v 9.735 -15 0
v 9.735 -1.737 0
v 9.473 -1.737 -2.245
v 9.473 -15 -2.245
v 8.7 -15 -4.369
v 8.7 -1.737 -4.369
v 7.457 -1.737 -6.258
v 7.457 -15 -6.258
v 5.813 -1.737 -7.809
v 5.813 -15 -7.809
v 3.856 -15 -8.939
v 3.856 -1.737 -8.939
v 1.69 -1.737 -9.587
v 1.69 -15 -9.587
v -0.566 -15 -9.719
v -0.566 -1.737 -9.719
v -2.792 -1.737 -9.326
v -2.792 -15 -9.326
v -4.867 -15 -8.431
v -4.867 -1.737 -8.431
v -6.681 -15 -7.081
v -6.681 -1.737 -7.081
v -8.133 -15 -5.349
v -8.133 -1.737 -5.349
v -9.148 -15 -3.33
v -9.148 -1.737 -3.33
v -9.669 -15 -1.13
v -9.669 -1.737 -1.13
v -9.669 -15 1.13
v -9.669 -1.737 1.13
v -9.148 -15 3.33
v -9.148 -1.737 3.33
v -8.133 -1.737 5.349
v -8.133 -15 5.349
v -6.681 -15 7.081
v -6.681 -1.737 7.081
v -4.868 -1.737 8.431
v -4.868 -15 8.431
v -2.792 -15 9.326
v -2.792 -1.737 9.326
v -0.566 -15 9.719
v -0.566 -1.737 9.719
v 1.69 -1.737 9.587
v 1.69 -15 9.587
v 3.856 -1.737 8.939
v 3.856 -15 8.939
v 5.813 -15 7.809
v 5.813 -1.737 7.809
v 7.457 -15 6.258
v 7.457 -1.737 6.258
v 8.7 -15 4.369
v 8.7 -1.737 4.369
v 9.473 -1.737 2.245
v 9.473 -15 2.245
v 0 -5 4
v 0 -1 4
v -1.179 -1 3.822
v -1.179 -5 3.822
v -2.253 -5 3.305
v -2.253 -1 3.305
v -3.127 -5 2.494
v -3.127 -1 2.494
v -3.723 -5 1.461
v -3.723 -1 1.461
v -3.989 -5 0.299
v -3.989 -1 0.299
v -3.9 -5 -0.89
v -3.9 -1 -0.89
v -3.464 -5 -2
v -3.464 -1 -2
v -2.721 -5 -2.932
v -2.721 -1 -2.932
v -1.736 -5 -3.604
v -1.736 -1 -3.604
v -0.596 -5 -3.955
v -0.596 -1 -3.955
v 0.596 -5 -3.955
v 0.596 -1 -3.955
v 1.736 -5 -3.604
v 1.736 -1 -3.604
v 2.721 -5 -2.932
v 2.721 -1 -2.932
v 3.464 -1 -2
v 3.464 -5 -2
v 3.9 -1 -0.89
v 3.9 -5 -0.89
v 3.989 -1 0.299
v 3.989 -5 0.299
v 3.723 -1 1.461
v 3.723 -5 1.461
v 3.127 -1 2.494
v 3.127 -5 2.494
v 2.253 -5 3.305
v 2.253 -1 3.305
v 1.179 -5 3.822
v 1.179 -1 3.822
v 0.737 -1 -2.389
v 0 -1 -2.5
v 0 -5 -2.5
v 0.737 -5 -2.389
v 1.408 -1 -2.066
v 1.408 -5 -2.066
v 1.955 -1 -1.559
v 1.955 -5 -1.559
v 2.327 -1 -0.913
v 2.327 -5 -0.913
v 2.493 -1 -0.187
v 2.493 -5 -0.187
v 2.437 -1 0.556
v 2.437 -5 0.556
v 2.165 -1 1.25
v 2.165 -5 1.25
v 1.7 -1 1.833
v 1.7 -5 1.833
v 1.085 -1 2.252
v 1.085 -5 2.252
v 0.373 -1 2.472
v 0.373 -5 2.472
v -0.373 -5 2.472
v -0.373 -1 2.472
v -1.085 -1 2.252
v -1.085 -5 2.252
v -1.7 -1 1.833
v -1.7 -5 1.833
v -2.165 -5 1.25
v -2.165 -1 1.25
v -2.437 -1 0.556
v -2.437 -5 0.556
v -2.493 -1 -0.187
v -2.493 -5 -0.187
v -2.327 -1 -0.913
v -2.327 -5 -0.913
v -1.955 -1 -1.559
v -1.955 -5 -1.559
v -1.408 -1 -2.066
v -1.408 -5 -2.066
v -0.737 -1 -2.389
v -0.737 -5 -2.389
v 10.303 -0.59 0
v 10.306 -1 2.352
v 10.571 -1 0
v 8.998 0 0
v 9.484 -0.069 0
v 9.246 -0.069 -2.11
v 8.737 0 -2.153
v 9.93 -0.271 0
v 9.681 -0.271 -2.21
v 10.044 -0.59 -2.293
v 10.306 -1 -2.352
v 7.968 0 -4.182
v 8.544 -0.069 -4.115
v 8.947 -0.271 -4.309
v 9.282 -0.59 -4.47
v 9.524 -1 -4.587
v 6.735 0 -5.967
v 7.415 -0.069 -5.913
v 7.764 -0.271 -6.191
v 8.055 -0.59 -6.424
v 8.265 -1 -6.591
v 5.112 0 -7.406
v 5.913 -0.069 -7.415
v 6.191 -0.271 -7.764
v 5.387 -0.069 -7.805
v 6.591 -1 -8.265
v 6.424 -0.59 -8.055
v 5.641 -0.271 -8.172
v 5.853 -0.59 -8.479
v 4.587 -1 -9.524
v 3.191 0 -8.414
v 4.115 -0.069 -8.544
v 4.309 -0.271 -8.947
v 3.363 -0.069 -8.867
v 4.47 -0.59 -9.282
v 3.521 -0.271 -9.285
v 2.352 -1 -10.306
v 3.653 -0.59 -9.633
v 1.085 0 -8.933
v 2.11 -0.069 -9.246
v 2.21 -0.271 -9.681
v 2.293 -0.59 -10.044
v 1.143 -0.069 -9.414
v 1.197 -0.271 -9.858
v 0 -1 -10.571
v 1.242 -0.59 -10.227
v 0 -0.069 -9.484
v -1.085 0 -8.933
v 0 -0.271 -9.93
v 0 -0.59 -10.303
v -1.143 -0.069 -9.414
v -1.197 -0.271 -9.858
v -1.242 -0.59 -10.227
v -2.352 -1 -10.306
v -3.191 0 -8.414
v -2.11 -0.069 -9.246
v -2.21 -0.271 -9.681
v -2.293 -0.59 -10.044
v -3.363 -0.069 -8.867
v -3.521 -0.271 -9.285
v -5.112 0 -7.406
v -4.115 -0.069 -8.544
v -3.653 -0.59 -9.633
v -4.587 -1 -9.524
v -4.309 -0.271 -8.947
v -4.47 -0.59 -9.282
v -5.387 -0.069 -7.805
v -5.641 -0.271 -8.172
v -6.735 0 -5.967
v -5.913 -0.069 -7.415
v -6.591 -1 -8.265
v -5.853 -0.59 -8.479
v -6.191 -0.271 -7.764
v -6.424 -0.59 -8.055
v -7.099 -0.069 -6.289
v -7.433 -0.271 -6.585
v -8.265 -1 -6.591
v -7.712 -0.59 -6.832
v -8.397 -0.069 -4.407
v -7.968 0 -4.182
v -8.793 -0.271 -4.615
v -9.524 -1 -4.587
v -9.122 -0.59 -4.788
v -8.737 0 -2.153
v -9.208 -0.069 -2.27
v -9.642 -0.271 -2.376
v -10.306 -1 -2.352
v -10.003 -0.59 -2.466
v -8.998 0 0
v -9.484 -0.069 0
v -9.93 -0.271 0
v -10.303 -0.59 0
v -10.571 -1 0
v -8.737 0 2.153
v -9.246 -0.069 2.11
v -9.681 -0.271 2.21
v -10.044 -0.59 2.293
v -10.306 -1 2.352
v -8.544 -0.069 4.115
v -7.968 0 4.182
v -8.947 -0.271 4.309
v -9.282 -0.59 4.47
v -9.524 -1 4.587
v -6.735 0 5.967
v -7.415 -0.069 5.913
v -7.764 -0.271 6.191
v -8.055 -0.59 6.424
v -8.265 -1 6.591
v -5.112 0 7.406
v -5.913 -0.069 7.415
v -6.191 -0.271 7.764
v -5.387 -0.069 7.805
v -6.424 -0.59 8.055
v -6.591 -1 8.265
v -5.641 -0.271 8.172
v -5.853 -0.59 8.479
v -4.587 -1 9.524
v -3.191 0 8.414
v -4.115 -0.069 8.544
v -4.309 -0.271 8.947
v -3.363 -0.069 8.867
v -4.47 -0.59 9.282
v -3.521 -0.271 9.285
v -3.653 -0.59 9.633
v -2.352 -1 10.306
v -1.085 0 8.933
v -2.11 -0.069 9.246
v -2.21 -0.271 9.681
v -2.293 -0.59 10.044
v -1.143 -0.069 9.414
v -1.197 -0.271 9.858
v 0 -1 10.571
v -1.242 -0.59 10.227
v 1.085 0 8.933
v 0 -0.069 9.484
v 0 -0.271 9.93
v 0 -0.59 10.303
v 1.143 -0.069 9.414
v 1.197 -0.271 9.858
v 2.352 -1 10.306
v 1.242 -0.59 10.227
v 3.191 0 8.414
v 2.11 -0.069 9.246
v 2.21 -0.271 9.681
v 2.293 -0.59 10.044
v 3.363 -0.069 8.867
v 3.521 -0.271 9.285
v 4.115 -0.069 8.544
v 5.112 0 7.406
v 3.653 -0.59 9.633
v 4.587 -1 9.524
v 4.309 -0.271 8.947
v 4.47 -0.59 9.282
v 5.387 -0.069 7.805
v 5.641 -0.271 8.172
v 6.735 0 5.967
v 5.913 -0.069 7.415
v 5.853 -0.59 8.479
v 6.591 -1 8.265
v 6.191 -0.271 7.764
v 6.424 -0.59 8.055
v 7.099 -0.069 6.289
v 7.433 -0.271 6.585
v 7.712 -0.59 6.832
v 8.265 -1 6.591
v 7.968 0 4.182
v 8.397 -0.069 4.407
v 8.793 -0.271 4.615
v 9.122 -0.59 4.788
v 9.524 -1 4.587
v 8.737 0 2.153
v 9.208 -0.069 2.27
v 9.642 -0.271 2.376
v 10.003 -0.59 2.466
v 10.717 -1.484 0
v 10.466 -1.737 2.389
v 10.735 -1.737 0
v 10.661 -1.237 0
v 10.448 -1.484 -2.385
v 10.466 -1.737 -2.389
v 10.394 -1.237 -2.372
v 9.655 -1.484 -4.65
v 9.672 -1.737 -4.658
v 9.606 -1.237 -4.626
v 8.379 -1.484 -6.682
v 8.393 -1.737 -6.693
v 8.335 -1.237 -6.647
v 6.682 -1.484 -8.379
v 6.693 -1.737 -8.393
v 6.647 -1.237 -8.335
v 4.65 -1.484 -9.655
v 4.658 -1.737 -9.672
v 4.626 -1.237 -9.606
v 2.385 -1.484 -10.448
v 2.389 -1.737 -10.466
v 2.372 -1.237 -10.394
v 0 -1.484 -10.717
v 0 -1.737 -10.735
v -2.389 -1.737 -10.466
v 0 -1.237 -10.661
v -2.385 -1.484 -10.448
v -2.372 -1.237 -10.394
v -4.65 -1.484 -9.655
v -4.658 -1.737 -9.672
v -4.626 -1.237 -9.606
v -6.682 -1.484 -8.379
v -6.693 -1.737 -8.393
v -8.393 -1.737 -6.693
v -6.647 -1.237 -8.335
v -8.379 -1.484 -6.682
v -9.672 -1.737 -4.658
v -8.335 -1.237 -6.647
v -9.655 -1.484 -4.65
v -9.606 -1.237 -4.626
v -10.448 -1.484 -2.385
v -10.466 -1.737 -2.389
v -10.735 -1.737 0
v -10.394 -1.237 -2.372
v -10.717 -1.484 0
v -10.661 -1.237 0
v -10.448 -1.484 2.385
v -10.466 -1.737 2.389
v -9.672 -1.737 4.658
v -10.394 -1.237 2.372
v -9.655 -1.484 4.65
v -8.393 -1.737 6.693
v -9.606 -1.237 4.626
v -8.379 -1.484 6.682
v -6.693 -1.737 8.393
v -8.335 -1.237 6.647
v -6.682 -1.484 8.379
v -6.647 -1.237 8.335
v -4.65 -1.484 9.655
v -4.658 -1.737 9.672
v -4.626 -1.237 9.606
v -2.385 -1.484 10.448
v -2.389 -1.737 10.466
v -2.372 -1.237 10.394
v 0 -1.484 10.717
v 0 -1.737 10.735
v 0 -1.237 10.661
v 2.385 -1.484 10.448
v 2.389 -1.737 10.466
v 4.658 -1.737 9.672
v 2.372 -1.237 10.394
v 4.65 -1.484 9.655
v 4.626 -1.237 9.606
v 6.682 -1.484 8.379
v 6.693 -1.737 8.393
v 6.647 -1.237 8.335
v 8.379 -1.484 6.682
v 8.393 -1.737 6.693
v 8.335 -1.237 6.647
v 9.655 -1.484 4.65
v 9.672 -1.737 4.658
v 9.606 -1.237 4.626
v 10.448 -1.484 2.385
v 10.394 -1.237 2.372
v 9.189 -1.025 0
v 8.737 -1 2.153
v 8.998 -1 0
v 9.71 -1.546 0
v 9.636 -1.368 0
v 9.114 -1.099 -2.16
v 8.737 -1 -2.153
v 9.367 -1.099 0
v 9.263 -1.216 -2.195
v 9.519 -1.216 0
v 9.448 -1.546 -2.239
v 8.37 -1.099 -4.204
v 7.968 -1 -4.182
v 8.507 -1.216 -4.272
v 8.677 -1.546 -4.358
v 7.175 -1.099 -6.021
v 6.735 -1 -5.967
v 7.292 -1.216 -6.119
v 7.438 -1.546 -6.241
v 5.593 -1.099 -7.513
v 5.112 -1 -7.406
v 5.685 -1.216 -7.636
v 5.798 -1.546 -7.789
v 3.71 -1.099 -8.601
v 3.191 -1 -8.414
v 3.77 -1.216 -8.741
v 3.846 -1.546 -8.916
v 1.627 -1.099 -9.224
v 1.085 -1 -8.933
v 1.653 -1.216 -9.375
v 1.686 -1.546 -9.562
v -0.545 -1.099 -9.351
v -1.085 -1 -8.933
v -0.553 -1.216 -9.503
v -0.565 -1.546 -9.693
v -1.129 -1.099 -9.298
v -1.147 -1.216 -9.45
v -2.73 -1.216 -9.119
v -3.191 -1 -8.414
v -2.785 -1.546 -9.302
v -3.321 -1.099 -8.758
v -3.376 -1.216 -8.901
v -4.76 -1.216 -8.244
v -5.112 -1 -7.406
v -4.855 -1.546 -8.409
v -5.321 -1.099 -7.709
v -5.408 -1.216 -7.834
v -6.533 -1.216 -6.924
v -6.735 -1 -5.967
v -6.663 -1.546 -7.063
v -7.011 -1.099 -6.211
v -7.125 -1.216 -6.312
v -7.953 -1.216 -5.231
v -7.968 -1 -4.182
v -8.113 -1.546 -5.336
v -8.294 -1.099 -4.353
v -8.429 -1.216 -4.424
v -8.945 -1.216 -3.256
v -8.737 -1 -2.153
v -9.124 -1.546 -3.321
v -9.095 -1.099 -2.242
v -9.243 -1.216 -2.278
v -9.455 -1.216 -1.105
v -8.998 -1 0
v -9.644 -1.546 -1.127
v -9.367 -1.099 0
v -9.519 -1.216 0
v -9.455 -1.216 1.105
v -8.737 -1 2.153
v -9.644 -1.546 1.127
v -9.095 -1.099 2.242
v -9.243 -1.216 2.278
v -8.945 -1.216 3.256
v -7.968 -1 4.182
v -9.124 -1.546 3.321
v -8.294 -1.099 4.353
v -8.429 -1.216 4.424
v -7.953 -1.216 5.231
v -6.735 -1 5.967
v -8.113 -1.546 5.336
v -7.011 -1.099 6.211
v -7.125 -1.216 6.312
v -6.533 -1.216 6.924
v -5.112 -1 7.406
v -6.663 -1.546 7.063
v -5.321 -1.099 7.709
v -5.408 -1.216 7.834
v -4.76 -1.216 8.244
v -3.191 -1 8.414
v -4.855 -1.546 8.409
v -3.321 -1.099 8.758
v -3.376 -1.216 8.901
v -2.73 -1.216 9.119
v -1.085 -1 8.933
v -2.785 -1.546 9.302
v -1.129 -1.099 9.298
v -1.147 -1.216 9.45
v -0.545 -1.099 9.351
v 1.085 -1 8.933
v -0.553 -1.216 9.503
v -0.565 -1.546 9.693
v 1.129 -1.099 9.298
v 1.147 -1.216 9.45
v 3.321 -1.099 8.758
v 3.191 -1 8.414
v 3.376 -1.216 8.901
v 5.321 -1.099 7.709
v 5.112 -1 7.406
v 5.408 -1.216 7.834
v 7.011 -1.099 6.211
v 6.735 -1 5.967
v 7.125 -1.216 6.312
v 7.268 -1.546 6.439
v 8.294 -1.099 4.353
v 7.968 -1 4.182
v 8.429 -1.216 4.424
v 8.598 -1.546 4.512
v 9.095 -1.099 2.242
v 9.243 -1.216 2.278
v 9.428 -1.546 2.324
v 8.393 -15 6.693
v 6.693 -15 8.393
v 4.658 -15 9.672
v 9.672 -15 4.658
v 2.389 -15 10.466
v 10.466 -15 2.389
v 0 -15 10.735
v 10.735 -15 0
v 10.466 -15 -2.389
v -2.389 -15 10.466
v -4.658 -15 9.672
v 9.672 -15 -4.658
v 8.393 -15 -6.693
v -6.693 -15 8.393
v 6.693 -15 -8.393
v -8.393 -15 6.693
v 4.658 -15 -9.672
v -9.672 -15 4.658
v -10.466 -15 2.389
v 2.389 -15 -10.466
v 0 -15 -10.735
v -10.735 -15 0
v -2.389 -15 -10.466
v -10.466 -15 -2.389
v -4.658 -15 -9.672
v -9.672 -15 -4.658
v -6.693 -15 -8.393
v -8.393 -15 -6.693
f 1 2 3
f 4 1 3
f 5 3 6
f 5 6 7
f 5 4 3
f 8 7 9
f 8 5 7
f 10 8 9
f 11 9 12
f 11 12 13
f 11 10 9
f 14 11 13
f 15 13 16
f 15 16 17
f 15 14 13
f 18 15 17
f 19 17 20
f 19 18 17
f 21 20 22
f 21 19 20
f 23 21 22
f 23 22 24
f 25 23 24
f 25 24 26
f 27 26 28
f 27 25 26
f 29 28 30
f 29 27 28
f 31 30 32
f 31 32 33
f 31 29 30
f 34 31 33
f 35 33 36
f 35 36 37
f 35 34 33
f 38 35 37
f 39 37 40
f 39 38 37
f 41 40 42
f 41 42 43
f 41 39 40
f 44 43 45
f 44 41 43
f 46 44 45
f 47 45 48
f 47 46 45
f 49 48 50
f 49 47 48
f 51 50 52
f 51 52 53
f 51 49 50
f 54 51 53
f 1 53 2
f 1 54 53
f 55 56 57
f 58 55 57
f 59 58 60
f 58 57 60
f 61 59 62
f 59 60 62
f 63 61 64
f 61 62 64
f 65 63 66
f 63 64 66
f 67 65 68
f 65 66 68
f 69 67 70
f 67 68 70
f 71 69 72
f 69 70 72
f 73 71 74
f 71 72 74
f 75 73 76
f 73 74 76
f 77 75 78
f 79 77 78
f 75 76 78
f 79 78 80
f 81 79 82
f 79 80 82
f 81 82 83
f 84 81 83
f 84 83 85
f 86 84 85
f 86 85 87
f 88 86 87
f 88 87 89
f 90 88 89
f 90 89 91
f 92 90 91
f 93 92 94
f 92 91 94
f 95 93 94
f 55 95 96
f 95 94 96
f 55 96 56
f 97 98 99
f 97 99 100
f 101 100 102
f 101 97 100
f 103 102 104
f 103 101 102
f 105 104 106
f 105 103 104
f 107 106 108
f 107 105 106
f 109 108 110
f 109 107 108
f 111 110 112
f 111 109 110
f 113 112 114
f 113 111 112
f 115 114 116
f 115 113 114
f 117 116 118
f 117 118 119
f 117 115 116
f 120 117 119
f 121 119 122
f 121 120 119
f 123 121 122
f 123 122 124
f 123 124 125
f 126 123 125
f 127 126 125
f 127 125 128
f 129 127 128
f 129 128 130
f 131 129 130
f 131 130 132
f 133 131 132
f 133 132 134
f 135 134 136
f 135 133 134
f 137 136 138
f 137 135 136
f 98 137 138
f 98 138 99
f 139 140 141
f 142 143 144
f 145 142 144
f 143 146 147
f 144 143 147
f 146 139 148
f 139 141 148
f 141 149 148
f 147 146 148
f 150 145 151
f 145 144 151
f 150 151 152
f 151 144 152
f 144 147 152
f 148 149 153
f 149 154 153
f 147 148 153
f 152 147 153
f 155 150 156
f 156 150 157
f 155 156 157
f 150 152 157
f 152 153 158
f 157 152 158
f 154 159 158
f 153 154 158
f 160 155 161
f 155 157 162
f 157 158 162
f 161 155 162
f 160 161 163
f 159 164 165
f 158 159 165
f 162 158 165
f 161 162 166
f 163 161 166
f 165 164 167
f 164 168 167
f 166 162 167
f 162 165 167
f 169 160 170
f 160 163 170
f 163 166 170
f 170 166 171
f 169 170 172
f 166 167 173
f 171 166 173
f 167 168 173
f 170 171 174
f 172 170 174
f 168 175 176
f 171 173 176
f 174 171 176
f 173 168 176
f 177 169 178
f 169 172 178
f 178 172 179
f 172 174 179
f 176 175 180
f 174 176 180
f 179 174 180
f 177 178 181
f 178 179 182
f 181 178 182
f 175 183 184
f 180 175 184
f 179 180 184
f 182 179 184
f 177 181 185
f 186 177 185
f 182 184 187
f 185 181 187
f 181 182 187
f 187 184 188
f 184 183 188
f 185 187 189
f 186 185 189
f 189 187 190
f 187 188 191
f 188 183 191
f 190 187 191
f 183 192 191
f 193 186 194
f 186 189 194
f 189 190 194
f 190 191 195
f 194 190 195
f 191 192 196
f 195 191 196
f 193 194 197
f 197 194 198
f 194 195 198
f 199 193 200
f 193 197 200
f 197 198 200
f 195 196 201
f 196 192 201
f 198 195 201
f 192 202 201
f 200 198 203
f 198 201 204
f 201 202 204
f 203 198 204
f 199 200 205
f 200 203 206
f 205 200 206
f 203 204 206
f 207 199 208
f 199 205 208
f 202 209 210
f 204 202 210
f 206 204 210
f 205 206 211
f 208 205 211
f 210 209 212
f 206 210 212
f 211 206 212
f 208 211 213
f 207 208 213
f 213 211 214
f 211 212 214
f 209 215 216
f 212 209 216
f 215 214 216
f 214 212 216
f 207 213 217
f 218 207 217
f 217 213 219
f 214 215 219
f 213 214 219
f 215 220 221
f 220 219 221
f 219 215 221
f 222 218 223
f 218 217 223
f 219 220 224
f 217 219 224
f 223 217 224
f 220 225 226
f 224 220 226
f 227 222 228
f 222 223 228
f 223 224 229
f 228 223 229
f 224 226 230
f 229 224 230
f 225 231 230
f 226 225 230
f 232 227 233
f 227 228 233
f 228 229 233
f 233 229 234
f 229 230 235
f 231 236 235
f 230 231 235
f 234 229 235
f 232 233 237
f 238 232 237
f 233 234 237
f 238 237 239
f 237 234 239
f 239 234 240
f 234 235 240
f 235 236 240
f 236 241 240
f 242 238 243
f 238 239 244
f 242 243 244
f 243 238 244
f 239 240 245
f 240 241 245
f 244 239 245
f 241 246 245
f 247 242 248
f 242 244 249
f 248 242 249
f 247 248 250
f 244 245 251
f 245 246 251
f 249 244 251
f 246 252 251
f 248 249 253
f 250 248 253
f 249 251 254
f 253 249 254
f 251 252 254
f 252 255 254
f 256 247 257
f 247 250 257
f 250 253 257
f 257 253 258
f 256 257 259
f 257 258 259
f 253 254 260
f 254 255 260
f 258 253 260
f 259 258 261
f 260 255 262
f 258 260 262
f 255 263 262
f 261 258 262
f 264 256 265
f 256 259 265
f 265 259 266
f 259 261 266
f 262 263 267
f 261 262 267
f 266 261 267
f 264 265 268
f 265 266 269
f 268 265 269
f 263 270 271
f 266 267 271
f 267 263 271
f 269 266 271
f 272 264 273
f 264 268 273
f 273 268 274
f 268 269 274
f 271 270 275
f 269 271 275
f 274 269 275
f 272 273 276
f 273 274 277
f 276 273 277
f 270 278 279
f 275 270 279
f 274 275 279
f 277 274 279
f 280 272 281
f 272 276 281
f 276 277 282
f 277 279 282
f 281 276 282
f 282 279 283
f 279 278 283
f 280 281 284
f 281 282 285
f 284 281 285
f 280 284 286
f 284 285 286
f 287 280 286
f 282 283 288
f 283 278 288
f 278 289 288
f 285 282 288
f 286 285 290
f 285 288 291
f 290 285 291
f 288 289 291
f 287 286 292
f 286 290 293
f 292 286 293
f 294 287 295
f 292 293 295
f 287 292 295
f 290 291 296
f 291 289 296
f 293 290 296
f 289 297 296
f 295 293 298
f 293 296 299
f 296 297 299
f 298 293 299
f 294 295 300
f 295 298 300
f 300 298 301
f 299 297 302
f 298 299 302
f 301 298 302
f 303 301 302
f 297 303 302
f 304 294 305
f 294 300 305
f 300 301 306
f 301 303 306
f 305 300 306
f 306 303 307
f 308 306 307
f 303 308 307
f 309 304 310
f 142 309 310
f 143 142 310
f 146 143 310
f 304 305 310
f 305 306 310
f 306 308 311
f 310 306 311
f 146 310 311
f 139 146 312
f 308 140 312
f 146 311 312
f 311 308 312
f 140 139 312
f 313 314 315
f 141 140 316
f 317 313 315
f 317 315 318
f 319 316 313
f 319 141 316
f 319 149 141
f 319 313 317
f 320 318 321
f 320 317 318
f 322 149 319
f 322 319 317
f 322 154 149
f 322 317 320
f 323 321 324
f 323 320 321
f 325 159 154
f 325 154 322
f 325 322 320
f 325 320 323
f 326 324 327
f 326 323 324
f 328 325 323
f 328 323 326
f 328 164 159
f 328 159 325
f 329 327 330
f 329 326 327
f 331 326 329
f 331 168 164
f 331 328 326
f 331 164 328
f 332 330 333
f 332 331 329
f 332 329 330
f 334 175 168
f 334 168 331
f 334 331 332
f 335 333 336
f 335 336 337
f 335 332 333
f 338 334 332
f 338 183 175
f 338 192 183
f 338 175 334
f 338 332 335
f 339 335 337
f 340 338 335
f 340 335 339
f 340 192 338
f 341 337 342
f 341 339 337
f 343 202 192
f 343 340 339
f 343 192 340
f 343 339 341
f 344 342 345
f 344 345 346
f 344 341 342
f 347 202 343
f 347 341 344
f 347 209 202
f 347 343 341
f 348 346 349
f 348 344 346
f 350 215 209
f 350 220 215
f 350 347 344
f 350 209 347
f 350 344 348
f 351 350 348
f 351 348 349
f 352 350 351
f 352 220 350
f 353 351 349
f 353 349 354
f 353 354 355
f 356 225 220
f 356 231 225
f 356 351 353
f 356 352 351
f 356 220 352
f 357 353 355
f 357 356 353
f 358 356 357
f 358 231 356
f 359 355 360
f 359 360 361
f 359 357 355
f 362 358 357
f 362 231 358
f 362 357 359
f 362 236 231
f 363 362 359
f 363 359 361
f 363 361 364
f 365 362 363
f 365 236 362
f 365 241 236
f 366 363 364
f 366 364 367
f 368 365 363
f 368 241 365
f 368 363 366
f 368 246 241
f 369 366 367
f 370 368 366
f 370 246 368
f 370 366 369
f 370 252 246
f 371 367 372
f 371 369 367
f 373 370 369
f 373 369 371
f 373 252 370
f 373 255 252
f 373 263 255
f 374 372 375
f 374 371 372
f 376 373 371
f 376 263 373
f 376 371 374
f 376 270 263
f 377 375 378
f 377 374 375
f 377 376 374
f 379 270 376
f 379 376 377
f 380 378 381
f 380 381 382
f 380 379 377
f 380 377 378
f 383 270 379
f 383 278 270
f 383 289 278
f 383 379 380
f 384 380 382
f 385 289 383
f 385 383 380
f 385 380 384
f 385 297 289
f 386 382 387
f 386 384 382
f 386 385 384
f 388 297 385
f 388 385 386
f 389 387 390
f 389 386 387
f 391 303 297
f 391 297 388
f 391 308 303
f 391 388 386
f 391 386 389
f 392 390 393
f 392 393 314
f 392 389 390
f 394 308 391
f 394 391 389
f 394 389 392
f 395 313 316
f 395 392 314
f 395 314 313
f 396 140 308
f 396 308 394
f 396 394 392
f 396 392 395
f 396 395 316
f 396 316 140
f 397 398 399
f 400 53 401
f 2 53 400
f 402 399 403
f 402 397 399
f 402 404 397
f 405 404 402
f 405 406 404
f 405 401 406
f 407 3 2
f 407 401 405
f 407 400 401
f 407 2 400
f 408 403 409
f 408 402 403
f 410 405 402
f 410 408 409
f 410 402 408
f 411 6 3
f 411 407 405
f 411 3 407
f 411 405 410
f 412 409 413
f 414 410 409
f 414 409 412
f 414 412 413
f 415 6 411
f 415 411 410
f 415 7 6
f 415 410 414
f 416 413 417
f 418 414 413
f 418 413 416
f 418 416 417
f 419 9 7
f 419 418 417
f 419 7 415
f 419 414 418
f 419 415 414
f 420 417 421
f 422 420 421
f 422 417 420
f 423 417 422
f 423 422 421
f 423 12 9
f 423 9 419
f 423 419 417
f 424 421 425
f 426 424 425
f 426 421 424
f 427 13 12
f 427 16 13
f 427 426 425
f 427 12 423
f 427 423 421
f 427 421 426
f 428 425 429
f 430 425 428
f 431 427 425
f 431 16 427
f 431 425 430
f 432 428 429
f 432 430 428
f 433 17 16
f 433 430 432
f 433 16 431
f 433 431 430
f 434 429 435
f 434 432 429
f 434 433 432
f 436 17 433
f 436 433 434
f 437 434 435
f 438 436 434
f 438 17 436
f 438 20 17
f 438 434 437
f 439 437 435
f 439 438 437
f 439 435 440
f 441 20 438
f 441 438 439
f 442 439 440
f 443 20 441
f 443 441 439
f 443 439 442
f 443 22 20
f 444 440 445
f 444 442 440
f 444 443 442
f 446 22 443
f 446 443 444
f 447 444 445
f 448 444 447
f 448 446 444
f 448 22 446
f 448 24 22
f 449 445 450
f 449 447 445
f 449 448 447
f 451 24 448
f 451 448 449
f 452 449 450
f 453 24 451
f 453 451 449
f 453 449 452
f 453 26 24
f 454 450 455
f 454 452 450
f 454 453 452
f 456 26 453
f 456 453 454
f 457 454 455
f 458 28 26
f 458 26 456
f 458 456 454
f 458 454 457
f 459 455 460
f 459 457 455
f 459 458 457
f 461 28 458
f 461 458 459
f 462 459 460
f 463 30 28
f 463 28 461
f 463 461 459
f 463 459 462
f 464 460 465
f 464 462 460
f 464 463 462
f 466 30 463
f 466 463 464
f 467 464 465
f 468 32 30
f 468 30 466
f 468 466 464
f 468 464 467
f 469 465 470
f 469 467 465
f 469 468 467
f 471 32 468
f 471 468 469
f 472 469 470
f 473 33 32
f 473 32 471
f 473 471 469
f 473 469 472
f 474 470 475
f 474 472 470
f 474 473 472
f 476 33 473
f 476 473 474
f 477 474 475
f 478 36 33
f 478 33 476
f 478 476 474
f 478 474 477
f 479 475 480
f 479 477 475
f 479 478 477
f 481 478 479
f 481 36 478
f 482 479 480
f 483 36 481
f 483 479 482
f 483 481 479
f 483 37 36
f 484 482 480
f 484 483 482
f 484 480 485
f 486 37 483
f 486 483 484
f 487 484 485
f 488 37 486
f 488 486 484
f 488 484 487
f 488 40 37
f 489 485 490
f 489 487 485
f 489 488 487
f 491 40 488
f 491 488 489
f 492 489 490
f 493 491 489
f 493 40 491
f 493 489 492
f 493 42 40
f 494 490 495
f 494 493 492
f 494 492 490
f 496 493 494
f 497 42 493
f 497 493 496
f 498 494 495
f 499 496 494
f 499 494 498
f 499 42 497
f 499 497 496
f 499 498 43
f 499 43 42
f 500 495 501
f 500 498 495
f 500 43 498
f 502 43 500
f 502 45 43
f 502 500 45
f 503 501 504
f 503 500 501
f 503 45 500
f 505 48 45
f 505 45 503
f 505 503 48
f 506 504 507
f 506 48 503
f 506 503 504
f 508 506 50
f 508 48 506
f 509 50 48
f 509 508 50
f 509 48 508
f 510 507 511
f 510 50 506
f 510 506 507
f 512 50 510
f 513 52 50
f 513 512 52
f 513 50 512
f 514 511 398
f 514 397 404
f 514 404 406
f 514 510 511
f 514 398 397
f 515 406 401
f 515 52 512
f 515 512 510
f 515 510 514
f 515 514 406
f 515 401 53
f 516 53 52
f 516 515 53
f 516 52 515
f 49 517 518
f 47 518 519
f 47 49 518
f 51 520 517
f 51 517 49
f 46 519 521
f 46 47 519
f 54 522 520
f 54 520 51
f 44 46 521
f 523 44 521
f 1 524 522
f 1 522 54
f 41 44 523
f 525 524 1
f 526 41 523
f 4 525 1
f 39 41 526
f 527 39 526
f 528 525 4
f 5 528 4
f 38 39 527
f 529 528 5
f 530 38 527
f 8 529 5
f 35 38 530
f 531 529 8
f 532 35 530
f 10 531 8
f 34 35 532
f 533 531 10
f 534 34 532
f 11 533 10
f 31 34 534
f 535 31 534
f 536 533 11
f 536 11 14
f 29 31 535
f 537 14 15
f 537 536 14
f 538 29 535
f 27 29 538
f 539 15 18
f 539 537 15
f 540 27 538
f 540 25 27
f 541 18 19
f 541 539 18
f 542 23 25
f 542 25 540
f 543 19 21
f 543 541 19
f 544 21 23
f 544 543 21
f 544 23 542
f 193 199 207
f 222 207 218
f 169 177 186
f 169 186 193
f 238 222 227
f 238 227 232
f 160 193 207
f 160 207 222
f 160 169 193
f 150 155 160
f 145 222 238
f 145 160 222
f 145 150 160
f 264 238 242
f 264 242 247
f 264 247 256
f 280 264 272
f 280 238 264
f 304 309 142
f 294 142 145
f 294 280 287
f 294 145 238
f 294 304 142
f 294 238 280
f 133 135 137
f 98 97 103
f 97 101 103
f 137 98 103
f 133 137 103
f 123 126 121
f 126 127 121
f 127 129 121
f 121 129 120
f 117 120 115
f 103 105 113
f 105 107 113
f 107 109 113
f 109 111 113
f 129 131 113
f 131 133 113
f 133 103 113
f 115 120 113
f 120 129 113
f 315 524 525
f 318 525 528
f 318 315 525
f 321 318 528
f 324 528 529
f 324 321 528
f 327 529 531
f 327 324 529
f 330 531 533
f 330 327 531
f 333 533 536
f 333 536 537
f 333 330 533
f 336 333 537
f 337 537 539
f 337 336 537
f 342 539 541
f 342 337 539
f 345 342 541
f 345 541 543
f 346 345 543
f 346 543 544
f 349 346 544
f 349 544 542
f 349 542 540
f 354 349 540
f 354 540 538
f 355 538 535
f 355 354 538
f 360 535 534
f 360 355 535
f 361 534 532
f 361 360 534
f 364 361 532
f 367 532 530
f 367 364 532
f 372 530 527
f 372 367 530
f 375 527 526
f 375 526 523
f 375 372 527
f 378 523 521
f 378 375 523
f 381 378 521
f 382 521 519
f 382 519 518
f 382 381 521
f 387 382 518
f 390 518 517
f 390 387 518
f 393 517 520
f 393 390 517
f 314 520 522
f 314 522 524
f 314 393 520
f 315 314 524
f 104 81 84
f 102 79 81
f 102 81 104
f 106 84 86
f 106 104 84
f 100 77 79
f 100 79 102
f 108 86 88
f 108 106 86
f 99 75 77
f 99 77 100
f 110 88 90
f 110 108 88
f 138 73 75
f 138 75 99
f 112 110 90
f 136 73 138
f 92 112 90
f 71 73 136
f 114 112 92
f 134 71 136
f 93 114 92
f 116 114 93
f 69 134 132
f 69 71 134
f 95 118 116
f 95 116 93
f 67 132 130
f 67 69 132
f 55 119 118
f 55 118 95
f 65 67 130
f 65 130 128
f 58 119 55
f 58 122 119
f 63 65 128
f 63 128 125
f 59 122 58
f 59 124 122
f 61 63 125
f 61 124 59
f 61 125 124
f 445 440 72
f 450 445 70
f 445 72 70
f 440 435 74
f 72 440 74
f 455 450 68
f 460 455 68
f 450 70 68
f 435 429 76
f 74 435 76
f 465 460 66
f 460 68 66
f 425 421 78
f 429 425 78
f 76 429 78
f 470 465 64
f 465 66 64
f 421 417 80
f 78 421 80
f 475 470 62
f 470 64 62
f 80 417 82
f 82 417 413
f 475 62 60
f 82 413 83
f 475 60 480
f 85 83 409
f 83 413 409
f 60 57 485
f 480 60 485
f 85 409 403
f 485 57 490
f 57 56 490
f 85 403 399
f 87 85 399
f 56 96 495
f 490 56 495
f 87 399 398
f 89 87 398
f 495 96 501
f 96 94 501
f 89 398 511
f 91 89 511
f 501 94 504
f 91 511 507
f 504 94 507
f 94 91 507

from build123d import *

# Parameters (mm, degrees)
SKETCH7_R           = 10.735
BASE_FLANGE1_DEPTH  = 1
SKETCH17_R          = 4
SKETCH17_R_2        = 2.5
BOSS_EXTRUDE1_DEPTH = 4


# Read off the part's stored shape, not the designer's step: Edge-Flange1
# Sheet-metal steps are written as plain solids
with BuildPart() as part:
    # Sketch7 → Base-Flange1 (new body)
    with BuildSketch(Plane(origin=(0, 0, 0), x_dir=(1, 0, 0), z_dir=(0, 1, 0))):
        with Locations(Location((0, 0, 0), (0, 0, 270))):
            Circle(SKETCH7_R)
    extrude(amount=-BASE_FLANGE1_DEPTH)

    # Edge-Flange1 outline → Edge-Flange1 (revolve, cut)
    with BuildSketch(Plane.XY):
        with BuildLine():
            Line((10.57104109, -1), (10.735, -1))
            Line((10.735, -1), (10.735, 0))
            Line((10.735, 0), (8.9984, 0))
            ThreePointArc((8.9984, 0), (9.930226164, -0.271171885), (10.57104109, -1))
        make_face()
    revolve(axis=Axis((0, 0, 0), (0, 1, 0)), mode=Mode.SUBTRACT)

    # Edge-Flange1 2 outline → Edge-Flange1 2 (revolve)
    with BuildSketch(Plane.XY):
        with BuildLine():
            Line((9.735, -1.7366), (9.735, -15))
            Line((9.735, -15), (10.735, -15))
            Line((10.735, -15), (10.735, -1.7366))
            ThreePointArc((10.735, -1.7366), (10.693514757, -1.359286442), (10.57104109, -1))
            Line((10.57104109, -1), (8.9984, -1))
            ThreePointArc((8.9984, -1), (9.519254855, -1.215745145), (9.735, -1.7366))
        make_face()
    revolve(axis=Axis((0, 0, 0), (0, 1, 0)))

    # Sketch17 → Boss-Extrude1 (add)
    with BuildSketch(Plane.XZ.offset(1)):
        with Locations(Location((0, 0, 0), (0, 0, 90))):
            Circle(SKETCH17_R)
        with Locations(Location((0, 0, 0), (0, 0, 270))):
            Circle(SKETCH17_R_2, mode=Mode.SUBTRACT)
    extrude(amount=BOSS_EXTRUDE1_DEPTH)


solid = part.part
